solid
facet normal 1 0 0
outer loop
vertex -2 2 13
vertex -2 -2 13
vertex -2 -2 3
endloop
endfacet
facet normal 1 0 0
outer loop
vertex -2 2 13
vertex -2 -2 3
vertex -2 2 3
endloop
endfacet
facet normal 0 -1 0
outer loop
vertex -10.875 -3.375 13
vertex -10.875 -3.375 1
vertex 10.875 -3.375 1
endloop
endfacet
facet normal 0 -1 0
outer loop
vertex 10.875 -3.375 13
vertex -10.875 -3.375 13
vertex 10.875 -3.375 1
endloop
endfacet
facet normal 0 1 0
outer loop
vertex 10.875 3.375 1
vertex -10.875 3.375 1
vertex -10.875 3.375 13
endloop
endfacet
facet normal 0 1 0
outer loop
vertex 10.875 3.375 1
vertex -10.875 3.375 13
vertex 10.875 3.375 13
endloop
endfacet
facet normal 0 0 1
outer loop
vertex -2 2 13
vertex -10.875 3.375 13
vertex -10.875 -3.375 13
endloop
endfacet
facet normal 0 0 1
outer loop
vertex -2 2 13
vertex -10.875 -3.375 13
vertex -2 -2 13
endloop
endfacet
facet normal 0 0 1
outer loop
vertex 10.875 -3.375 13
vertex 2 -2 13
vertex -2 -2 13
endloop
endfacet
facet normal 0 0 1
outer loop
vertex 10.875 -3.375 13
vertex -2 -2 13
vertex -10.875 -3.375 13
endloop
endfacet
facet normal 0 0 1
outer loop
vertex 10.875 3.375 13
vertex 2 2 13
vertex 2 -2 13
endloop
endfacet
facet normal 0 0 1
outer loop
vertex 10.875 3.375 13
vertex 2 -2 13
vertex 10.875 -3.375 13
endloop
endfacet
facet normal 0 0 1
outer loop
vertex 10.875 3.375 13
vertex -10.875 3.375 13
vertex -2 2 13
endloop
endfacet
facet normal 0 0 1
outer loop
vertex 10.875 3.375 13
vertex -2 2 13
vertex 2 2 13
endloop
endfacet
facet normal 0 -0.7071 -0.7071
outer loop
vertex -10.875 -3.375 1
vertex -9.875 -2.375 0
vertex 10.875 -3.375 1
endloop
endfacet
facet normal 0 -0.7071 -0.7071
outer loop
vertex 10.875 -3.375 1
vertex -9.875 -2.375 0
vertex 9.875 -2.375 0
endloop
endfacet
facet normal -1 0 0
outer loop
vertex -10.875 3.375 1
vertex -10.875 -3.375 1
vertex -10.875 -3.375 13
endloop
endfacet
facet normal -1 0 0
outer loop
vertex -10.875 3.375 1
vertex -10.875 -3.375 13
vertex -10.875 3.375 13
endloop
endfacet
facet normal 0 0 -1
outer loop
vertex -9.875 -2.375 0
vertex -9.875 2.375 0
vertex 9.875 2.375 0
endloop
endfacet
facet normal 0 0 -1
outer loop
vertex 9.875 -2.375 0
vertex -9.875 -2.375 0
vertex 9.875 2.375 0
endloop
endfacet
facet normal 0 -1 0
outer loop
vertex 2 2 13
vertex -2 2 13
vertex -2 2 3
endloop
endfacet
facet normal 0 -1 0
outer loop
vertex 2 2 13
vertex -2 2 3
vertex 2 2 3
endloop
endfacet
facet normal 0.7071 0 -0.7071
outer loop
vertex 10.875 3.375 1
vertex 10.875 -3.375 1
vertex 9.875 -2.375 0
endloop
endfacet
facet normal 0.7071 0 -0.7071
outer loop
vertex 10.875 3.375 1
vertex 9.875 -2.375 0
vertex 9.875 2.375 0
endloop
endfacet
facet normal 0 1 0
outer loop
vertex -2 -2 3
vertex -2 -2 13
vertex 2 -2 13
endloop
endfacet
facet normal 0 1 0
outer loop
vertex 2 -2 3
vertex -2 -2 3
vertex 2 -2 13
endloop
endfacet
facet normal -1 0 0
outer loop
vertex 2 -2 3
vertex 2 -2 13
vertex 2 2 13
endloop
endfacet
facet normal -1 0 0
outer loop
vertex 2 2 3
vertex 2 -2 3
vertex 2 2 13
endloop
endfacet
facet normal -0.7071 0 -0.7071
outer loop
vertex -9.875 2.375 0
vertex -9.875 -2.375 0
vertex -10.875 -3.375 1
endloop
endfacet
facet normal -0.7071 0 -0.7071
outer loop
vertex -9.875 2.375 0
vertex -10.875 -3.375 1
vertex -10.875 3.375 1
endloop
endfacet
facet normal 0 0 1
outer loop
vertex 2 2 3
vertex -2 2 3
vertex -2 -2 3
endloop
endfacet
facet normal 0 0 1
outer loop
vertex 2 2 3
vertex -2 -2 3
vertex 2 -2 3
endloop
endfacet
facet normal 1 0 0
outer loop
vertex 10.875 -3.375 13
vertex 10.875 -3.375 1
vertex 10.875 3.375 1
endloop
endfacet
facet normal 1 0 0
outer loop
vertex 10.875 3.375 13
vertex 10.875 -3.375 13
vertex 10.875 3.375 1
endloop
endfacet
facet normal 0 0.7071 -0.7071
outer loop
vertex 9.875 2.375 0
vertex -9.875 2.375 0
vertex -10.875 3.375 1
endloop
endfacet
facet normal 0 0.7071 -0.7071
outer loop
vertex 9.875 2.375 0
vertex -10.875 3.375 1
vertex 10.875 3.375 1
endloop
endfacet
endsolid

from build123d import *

# Parameters (mm, degrees)
SKETCH_W     = 21.75
SKETCH_H     = 6.75
PAD_DEPTH    = 13
SKETCH001_W  = 4
SKETCH001_H  = 4
POCKET_DEPTH = 10
CHAMFER_SIZE = 1


with BuildPart() as part:
    # Sketch → Pad (new body)
    with BuildSketch(Plane.XY):
        Rectangle(SKETCH_W, SKETCH_H)
    extrude(amount=PAD_DEPTH)

    # Sketch001 (on Face6 of Pad) → Pocket (cut)
    with BuildSketch(Plane.XY.offset(13)):
        Rectangle(SKETCH001_W, SKETCH001_H)
    extrude(amount=-POCKET_DEPTH, mode=Mode.SUBTRACT)

    # Chamfer
    chamfer_edges = [part.edges().sort_by_distance(p)[0] for p in [
        (0, 3.375, 0),
        (10.875, 0, 0),
        (0, -3.375, 0),
        (-10.875, 0, 0),
    ]]
    chamfer(chamfer_edges, length=CHAMFER_SIZE)


solid = part.part
